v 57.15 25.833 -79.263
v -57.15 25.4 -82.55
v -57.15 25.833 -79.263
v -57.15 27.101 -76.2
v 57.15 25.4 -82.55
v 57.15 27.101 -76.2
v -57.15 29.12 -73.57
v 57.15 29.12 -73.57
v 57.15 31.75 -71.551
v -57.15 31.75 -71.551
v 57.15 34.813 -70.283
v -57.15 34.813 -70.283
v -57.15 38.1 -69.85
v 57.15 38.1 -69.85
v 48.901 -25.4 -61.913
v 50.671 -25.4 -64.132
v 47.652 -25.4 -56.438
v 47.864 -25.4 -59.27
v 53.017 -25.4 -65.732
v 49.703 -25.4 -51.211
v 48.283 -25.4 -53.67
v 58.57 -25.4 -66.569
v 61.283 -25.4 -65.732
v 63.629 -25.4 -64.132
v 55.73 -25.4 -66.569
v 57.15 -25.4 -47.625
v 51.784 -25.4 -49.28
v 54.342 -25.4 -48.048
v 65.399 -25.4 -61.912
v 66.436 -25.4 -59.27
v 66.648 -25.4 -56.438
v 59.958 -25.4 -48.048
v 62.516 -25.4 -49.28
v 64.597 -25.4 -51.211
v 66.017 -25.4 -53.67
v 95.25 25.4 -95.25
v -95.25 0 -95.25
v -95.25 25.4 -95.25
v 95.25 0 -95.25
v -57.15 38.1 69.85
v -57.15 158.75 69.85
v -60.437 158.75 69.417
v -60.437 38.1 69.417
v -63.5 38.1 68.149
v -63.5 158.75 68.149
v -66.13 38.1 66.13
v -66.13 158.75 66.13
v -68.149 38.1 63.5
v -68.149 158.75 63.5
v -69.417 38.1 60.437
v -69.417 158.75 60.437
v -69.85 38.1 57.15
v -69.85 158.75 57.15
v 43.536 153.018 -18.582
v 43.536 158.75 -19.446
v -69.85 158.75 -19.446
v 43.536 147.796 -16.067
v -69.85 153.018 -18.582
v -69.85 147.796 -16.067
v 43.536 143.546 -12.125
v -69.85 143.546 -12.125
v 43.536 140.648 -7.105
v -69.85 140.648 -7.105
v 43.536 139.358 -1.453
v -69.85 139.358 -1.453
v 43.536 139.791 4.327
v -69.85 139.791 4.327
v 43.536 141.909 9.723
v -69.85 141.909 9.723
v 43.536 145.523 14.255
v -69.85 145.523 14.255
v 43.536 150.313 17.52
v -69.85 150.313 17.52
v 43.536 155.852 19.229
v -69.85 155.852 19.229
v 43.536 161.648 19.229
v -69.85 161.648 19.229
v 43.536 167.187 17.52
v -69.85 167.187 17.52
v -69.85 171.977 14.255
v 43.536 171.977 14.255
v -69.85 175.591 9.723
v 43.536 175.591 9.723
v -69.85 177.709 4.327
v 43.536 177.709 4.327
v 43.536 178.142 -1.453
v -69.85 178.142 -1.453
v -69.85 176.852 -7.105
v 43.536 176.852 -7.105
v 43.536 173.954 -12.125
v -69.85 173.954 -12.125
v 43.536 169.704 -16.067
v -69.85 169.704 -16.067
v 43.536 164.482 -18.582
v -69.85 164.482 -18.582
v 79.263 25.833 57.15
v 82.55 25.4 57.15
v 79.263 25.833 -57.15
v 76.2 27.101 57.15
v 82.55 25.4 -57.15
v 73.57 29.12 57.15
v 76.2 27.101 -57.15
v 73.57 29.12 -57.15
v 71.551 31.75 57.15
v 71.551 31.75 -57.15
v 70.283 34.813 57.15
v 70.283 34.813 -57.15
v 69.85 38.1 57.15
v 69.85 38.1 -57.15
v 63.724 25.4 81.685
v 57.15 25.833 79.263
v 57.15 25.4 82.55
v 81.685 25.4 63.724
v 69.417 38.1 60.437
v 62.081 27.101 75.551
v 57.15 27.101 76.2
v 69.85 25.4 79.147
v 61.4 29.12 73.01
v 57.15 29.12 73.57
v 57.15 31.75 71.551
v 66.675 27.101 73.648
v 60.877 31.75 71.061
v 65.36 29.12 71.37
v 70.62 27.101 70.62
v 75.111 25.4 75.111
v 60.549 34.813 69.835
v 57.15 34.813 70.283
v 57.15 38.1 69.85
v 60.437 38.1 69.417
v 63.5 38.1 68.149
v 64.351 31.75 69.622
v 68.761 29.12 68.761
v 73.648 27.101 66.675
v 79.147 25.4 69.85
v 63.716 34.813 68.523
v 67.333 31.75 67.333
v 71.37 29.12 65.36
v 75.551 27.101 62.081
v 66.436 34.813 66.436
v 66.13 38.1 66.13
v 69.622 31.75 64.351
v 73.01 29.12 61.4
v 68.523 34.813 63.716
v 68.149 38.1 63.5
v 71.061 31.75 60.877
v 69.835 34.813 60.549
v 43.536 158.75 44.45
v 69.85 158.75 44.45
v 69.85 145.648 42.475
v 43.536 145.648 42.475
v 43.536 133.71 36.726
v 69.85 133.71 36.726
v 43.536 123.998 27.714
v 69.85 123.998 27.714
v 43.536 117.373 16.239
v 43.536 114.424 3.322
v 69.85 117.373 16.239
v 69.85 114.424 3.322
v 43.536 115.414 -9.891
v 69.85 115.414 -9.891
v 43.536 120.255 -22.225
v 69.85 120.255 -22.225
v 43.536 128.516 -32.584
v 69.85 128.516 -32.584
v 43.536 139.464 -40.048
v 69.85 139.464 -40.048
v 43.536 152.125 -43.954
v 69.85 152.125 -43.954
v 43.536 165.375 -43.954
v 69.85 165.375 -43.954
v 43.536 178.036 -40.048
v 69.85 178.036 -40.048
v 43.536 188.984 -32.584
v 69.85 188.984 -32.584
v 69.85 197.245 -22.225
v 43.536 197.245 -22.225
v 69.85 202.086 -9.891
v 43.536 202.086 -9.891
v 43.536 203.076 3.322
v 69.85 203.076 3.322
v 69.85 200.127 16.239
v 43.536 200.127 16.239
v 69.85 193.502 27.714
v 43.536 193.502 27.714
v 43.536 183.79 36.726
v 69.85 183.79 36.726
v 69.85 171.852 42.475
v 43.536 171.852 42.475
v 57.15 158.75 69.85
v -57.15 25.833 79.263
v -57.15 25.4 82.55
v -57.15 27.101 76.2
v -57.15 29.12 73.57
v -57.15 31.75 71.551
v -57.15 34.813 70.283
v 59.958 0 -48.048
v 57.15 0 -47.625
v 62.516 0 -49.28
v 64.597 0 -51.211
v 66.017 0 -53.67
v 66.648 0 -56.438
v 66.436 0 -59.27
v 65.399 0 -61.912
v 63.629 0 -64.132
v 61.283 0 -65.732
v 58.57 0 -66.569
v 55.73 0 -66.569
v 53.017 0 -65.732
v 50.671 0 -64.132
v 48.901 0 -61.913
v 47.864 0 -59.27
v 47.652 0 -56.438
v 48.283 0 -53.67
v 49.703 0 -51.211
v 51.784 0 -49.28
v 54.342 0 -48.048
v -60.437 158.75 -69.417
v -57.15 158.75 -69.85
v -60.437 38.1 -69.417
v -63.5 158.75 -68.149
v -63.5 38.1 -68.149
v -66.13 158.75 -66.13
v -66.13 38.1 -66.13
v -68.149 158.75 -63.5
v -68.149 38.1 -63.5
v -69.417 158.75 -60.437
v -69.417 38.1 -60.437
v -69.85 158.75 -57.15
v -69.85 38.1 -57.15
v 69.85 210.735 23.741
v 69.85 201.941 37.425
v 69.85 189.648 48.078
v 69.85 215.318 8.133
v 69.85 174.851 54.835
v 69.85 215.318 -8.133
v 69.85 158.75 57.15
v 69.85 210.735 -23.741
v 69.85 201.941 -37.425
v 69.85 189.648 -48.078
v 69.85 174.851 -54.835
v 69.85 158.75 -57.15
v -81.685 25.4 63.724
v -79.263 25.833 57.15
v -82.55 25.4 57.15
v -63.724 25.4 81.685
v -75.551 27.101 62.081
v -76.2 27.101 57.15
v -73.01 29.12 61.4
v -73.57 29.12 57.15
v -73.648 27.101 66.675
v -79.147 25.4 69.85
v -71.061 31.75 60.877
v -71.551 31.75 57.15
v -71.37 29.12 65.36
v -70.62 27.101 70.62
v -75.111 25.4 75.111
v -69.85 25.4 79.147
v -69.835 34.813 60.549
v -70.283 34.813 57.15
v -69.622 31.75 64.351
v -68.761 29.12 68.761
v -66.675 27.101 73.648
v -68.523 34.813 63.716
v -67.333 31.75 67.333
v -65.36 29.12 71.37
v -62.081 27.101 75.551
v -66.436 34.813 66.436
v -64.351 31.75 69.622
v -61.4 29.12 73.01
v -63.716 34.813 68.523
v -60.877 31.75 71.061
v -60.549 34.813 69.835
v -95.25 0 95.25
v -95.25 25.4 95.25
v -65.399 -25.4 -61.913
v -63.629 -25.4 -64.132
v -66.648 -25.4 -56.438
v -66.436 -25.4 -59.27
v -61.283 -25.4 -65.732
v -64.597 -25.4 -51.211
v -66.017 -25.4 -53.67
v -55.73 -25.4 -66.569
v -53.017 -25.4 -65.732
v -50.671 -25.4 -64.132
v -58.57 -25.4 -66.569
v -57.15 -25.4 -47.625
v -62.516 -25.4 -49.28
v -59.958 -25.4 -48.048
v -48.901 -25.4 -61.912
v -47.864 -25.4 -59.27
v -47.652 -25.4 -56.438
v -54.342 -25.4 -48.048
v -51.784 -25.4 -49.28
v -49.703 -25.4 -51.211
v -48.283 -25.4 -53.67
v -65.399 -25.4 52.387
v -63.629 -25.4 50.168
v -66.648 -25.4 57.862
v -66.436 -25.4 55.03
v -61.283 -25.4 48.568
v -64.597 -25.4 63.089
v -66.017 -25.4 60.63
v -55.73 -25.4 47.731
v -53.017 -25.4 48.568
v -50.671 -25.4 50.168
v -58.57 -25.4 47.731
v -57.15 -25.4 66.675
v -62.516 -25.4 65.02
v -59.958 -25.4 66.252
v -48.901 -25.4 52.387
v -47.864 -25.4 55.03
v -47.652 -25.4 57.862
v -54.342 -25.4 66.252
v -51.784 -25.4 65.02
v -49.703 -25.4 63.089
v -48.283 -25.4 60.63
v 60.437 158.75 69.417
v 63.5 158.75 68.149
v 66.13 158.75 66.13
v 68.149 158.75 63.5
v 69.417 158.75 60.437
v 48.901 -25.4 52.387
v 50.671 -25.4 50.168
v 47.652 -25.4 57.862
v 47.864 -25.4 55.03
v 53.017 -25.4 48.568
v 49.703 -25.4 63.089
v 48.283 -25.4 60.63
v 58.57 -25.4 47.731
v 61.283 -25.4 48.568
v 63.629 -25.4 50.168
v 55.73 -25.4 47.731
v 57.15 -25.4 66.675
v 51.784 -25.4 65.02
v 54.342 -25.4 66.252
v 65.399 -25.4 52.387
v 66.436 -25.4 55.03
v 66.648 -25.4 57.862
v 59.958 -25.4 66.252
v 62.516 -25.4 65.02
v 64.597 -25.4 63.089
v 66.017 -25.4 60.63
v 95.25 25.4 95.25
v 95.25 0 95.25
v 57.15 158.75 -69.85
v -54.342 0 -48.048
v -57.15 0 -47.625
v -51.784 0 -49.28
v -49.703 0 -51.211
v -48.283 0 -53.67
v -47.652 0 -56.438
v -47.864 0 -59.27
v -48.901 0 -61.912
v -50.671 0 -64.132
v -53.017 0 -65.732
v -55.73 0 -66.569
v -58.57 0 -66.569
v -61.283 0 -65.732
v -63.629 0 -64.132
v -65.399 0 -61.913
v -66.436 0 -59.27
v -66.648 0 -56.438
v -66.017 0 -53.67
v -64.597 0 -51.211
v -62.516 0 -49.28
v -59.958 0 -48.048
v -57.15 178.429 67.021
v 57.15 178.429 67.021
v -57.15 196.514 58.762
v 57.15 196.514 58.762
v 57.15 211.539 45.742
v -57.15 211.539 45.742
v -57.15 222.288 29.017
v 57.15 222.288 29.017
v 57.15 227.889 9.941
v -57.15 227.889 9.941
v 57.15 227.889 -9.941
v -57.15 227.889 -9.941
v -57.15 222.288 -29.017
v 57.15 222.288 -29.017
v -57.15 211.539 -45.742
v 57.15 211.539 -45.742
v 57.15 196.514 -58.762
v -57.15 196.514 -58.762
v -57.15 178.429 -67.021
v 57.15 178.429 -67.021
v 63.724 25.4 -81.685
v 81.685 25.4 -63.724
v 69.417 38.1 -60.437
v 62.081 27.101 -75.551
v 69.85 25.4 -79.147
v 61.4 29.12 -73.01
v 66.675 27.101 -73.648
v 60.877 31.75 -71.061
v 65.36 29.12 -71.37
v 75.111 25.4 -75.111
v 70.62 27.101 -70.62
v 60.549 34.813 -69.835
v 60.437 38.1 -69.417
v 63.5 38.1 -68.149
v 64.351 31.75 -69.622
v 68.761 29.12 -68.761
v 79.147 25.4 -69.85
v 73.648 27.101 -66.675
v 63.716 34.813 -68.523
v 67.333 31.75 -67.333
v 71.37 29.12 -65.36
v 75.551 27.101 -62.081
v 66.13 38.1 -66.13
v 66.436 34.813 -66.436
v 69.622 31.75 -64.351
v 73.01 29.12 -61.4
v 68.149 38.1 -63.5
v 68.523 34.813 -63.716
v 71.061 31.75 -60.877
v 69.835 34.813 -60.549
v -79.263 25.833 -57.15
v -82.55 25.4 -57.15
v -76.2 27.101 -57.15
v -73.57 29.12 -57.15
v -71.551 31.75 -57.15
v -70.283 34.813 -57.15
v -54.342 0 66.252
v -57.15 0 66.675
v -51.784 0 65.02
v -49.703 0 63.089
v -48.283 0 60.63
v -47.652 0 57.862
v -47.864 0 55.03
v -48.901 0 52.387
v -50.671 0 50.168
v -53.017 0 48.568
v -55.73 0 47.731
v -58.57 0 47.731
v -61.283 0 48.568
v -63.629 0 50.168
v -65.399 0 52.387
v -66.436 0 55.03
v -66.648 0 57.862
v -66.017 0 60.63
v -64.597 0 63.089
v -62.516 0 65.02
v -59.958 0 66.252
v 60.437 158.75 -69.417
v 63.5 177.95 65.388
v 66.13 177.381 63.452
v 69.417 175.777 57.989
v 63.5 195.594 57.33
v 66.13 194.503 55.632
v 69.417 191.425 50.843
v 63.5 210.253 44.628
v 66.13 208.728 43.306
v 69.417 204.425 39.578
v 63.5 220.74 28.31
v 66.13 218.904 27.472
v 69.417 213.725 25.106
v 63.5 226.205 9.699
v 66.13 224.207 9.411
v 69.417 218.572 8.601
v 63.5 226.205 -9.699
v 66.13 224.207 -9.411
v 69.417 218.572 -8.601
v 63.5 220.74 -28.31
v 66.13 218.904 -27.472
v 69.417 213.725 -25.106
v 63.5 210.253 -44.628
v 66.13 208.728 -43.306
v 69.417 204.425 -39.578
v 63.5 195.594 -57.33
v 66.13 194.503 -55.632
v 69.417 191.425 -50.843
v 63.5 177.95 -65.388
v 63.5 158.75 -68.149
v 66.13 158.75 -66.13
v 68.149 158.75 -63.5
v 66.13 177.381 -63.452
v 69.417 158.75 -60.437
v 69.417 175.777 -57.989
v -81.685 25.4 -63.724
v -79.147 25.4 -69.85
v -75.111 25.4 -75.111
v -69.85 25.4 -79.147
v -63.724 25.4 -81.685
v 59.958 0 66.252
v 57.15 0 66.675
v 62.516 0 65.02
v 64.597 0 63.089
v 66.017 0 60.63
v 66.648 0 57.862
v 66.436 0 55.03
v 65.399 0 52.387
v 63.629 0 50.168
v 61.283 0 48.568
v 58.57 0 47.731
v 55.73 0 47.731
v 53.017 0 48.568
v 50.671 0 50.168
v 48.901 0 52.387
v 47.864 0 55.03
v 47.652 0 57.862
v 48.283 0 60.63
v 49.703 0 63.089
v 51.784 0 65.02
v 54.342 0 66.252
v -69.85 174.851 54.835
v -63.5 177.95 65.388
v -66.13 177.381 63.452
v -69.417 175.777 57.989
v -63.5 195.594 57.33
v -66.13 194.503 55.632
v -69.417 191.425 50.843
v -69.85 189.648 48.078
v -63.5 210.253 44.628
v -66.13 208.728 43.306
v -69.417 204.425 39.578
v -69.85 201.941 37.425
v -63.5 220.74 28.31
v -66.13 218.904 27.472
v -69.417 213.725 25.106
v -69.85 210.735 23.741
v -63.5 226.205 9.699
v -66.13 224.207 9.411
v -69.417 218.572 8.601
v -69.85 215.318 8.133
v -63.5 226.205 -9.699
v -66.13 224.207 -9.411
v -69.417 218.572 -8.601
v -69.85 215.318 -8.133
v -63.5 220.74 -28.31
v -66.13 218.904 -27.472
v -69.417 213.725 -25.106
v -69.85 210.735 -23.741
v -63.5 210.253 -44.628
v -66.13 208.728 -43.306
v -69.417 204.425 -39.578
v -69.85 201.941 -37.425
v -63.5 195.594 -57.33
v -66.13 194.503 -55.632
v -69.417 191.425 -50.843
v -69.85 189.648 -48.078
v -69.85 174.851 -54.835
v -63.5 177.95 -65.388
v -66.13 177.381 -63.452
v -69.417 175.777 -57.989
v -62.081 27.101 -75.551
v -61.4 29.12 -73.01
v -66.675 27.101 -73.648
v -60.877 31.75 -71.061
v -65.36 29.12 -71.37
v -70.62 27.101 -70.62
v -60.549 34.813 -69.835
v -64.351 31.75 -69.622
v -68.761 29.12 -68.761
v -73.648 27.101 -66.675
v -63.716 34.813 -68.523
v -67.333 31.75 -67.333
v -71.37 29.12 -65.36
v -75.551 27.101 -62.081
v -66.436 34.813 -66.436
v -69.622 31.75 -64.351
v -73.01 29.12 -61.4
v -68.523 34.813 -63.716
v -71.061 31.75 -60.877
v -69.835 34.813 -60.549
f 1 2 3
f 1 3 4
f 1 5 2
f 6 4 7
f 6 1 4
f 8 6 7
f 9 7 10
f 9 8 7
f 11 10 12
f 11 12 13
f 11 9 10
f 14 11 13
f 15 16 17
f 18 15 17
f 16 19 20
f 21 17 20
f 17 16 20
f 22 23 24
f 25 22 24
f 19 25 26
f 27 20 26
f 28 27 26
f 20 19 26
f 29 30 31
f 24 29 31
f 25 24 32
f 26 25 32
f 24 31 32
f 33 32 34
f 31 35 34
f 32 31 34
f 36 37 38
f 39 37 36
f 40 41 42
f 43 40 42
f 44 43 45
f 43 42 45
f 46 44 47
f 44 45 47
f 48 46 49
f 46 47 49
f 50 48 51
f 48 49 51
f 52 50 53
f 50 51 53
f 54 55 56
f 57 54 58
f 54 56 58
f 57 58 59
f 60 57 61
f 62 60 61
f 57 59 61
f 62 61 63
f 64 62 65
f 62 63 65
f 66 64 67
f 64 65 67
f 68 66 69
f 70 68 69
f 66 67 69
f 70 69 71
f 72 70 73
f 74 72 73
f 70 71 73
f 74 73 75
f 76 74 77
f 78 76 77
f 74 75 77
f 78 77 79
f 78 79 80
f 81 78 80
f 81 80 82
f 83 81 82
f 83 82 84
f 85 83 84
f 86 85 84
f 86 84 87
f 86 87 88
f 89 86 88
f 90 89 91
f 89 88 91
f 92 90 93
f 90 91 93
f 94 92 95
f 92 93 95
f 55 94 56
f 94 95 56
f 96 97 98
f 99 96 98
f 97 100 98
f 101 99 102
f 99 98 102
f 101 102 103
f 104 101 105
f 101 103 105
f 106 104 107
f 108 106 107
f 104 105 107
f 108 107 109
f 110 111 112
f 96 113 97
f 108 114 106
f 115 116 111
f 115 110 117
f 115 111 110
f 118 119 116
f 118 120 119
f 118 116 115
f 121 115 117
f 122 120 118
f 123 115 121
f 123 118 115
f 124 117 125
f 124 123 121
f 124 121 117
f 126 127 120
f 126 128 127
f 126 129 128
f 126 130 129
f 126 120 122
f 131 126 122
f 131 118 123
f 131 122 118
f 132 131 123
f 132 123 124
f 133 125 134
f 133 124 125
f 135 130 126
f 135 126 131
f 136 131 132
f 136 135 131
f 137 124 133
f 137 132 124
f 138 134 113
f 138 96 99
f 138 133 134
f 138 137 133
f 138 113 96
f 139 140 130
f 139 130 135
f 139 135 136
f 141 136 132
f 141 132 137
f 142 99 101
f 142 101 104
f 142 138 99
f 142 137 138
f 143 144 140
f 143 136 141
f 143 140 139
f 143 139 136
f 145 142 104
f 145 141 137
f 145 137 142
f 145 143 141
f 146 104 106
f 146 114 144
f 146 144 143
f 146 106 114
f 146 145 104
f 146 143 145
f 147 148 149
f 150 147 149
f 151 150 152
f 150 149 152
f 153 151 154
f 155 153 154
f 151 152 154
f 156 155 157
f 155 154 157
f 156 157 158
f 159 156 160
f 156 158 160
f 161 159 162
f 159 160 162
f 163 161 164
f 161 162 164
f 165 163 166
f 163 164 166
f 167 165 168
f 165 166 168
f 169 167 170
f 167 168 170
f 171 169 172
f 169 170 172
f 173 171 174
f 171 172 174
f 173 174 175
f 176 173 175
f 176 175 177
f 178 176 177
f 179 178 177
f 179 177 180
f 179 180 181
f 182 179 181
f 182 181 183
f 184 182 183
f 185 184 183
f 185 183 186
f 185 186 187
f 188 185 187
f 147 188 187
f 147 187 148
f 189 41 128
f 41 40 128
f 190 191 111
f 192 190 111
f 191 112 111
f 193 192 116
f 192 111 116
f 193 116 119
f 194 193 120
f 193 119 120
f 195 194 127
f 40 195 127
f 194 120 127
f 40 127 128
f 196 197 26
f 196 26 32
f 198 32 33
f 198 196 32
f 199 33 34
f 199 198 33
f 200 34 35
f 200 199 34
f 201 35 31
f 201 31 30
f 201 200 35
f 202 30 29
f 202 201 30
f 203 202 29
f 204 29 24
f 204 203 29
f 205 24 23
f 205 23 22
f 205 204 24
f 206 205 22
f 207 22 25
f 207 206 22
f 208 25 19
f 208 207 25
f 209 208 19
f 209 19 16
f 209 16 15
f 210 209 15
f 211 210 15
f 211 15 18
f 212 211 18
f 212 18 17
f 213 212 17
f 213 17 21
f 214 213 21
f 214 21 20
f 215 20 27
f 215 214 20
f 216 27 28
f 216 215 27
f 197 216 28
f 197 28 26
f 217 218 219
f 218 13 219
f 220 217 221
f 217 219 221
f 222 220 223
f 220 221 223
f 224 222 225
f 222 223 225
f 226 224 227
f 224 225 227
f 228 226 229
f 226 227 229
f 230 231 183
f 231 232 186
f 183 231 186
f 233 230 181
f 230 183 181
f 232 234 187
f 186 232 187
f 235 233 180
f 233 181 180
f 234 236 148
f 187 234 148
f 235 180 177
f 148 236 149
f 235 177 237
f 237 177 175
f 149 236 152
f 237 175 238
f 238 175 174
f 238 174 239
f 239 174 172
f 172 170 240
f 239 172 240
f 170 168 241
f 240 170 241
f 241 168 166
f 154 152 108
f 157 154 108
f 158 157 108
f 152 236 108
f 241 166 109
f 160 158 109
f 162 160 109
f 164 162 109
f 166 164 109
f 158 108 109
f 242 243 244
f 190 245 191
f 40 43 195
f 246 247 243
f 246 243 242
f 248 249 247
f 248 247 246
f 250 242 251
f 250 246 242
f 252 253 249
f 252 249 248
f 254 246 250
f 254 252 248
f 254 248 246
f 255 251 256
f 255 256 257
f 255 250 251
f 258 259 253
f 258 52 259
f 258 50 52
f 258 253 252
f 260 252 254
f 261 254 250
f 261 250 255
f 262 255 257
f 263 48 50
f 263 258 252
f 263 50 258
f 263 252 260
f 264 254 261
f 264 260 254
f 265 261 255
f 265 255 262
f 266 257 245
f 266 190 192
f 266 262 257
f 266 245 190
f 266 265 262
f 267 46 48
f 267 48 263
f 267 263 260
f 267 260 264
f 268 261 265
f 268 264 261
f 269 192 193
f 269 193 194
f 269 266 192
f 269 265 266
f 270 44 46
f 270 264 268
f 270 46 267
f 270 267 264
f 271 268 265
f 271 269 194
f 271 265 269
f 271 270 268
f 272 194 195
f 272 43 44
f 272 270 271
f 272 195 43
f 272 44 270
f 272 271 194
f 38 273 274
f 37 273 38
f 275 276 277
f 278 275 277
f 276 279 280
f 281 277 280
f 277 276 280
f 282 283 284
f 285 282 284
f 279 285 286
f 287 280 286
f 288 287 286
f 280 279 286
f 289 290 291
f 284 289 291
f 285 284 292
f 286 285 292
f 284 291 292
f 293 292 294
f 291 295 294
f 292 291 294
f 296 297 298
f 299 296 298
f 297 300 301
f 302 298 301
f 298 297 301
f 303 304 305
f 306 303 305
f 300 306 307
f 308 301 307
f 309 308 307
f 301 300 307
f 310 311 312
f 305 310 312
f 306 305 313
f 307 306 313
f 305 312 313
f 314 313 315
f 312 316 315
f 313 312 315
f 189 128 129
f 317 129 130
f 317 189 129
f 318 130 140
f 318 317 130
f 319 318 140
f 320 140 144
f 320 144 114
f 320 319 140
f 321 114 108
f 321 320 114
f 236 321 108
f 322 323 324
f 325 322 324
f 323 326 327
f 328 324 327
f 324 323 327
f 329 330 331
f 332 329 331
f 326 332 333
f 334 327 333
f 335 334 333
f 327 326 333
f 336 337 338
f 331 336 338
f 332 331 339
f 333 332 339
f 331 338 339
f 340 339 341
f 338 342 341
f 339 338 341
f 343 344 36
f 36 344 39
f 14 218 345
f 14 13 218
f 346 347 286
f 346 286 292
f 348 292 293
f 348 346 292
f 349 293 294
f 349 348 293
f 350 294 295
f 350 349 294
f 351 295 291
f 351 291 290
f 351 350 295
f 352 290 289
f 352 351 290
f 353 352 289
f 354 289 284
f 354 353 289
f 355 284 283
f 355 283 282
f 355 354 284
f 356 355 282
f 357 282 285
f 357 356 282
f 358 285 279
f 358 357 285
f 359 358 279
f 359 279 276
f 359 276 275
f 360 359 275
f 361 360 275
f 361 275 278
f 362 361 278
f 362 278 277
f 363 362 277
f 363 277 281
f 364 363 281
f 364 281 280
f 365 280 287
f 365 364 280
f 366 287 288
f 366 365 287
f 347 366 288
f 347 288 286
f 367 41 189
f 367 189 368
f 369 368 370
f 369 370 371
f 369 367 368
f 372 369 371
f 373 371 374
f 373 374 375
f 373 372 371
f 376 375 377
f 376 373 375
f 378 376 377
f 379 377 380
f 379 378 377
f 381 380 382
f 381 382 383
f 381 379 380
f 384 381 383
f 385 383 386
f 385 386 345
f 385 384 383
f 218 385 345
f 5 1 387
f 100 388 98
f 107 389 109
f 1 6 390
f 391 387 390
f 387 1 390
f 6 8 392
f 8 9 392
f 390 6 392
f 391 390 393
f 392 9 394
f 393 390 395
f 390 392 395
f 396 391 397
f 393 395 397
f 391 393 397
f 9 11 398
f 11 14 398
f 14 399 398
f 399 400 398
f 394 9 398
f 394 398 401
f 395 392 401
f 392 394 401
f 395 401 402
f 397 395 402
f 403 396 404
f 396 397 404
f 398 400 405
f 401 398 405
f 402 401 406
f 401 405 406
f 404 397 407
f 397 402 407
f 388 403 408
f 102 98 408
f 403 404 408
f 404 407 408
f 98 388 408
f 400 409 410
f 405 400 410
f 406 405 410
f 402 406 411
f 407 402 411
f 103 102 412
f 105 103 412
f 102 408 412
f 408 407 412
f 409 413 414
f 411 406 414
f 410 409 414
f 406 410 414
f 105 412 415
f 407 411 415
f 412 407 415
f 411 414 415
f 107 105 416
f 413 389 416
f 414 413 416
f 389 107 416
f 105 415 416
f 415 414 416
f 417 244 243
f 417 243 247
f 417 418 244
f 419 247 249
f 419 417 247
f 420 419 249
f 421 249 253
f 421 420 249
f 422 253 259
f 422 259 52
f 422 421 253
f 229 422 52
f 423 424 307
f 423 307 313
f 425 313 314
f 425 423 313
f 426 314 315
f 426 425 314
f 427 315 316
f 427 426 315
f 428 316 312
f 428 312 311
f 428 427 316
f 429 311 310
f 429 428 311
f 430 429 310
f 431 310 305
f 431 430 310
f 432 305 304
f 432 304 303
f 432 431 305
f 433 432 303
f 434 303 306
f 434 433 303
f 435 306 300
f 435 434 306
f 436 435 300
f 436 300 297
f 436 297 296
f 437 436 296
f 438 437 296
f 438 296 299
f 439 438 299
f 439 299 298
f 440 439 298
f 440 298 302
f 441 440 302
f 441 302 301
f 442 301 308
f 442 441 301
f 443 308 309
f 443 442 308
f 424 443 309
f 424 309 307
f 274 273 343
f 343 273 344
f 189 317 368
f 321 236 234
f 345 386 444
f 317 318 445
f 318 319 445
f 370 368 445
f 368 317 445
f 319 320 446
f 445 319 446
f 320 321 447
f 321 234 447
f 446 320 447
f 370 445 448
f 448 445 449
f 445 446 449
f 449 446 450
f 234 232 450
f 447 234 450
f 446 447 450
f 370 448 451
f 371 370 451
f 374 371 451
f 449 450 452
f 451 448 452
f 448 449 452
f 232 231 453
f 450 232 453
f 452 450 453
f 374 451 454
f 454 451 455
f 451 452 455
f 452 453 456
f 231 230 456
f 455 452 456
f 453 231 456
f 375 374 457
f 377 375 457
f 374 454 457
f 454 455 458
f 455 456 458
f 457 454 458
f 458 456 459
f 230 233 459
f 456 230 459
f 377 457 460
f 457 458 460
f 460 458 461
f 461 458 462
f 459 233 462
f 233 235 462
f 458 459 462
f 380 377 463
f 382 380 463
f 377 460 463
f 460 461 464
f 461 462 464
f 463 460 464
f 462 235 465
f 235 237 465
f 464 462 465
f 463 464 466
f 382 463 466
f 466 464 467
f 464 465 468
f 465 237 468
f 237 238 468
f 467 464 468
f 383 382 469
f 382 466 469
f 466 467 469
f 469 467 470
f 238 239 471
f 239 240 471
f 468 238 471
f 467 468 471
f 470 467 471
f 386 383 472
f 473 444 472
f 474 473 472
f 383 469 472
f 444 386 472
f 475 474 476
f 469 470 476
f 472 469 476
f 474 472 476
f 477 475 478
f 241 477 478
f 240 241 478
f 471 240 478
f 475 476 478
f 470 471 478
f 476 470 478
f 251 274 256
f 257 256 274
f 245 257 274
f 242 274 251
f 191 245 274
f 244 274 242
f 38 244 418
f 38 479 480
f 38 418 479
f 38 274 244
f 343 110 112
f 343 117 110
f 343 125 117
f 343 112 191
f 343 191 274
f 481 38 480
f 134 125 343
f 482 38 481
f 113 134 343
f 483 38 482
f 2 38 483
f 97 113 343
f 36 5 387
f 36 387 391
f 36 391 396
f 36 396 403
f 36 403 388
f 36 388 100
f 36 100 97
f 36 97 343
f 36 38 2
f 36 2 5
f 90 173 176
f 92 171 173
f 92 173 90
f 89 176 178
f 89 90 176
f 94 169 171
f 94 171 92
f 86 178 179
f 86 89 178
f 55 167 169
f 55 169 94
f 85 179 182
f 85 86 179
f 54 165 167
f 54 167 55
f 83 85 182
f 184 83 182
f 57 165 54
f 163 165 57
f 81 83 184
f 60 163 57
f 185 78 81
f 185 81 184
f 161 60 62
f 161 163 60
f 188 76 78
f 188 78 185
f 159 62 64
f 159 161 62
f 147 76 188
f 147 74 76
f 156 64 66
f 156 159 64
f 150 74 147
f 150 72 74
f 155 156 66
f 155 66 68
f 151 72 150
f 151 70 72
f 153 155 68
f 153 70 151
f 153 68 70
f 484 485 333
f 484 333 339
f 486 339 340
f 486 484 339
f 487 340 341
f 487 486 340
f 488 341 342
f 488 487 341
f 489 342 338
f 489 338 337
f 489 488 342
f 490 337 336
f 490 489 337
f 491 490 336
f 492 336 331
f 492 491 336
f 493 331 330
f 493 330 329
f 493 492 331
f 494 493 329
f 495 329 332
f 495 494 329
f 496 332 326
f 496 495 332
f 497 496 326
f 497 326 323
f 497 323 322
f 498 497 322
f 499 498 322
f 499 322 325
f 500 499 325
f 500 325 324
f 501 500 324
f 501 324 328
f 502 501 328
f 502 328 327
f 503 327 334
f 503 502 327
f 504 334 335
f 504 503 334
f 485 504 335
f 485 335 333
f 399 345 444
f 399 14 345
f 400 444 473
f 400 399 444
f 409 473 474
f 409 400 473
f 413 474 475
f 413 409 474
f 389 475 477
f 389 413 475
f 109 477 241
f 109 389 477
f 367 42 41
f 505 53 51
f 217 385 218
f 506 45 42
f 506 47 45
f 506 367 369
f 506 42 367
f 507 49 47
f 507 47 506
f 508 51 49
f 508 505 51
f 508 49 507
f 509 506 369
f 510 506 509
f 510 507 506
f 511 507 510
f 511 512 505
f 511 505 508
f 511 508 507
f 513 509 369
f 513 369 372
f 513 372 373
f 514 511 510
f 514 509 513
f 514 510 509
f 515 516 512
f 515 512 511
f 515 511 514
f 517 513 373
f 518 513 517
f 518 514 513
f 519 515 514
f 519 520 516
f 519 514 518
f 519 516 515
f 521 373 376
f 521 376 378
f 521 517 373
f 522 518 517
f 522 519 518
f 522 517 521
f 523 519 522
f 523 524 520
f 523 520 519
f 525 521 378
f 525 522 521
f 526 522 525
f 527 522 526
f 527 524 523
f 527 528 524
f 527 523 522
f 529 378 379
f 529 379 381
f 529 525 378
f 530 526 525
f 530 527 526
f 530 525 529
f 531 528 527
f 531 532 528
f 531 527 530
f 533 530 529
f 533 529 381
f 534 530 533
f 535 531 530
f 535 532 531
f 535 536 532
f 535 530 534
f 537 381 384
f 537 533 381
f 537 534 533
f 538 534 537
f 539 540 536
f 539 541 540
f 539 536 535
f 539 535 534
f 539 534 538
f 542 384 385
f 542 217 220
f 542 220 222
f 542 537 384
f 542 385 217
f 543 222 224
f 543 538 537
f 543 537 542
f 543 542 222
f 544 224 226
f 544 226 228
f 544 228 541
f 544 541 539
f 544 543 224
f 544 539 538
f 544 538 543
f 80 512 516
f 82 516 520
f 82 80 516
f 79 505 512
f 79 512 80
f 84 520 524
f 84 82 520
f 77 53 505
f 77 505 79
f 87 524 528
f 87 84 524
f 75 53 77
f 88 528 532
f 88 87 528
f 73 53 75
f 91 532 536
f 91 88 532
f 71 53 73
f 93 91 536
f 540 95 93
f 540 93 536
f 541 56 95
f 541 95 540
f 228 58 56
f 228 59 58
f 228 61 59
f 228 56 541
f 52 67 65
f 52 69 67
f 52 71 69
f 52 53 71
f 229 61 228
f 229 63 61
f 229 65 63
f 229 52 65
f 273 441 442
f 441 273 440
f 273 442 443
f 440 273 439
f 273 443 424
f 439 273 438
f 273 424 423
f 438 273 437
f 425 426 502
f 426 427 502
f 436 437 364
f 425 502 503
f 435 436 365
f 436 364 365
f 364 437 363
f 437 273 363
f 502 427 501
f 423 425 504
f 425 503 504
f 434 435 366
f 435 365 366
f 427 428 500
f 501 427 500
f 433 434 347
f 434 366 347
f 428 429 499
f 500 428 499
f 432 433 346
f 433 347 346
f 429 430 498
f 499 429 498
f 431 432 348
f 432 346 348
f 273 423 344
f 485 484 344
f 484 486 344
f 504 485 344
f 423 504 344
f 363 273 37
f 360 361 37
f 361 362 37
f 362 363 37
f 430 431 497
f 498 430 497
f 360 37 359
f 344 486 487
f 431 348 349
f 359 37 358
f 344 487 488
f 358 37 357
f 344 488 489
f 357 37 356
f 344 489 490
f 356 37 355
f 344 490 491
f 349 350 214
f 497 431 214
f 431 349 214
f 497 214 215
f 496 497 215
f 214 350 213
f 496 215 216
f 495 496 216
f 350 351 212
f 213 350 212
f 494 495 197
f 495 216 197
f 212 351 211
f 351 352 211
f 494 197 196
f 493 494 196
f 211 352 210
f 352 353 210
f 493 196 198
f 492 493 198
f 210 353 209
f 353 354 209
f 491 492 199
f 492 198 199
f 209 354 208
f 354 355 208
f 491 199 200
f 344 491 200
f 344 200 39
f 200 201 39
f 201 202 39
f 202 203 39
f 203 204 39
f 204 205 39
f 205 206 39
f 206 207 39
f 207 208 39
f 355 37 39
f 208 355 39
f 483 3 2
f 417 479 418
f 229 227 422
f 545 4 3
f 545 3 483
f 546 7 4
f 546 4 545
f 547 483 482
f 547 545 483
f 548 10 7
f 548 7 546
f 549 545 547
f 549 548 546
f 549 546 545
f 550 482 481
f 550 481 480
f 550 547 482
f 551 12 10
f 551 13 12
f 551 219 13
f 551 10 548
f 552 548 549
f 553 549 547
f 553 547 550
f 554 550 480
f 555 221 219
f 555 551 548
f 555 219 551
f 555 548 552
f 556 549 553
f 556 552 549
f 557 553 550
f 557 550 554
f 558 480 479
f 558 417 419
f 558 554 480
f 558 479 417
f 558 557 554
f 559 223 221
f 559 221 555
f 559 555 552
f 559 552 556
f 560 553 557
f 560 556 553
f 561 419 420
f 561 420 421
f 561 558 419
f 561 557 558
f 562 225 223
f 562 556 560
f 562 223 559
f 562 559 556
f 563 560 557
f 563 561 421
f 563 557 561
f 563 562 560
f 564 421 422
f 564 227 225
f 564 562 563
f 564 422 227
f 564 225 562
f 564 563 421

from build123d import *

# Parameters (mm, degrees)
SKETCH1_W                                   = 190.5
SKETCH1_H                                   = 190.5
SKETCH1_R                                   = 9.525
BOSS_EXTRUDE1_DEPTH                         = 25.4
SKETCH1_3_R                                 = 9.525
BOSS_EXTRUDE2_DEPTH                         = 25.4
SKETCH3_W                                   = 139.7
SKETCH3_H                                   = 139.7
BOSS_EXTRUDE3_DEPTH                         = 203.2
FILLET1_RADIUS                              = 69.85
FILLET1_LENGTH                              = 139.7
CBORE_FOR_1_1_2_HEAVY_HEX_BOLT1_D           = 38.89248
CBORE_FOR_1_1_2_HEAVY_HEX_BOLT1_CBORE_D     = 88.9
CBORE_FOR_1_1_2_HEAVY_HEX_BOLT1_CBORE_DEPTH = 26.3144
FILLET2_R                                   = 12.7


with BuildPart() as part:
    # Sketch1 → Boss-Extrude1 (new body)
    # profile 1 of 5: a face of its own
    with BuildSketch(Plane(origin=(0, 0, 0), x_dir=(1, 0, 0), z_dir=(0, 1, 0))):
        Rectangle(SKETCH1_W, SKETCH1_H)
        with Locations((-57.15, -57.15)):
            Circle(SKETCH1_R, mode=Mode.SUBTRACT)
        with Locations((57.15, -57.15)):
            Circle(SKETCH1_R, mode=Mode.SUBTRACT)
        with Locations((57.15, 57.15)):
            Circle(SKETCH1_R, mode=Mode.SUBTRACT)
        with Locations((-57.15, 57.15)):
            Circle(SKETCH1_R, mode=Mode.SUBTRACT)
    # profile 2 of 5: a face of its own
    with BuildSketch(Plane(origin=(0, 0, 0), x_dir=(1, 0, 0), z_dir=(0, 1, 0))):
        with Locations((-57.15, -57.15)):
            Circle(SKETCH1_R)
    # profile 3 of 5: a face of its own
    with BuildSketch(Plane(origin=(0, 0, 0), x_dir=(1, 0, 0), z_dir=(0, 1, 0))):
        with Locations((-57.15, 57.15)):
            Circle(SKETCH1_R)
    # profile 4 of 5: a face of its own
    with BuildSketch(Plane(origin=(0, 0, 0), x_dir=(1, 0, 0), z_dir=(0, 1, 0))):
        with Locations((57.15, 57.15)):
            Circle(SKETCH1_R)
    # profile 5 of 5: a face of its own
    with BuildSketch(Plane(origin=(0, 0, 0), x_dir=(1, 0, 0), z_dir=(0, 1, 0))):
        with Locations((57.15, -57.15)):
            Circle(SKETCH1_R)
    extrude(amount=BOSS_EXTRUDE1_DEPTH)

    # Sketch1<3> → Boss-Extrude2 (add)
    with BuildSketch(Plane(origin=(0, 0, 0), x_dir=(1, 0, 0), z_dir=(0, 1, 0))):
        with Locations(Location((-57.15, 57.15, 0), (0, 0, 270))):
            Circle(SKETCH1_3_R)
        with Locations(Location((57.15, 57.15, 0), (0, 0, 270))):
            Circle(SKETCH1_3_R)
        with Locations(Location((57.15, -57.15, 0), (0, 0, 270))):
            Circle(SKETCH1_3_R)
        with Locations(Location((-57.15, -57.15, 0), (0, 0, 270))):
            Circle(SKETCH1_3_R)
    extrude(amount=-BOSS_EXTRUDE2_DEPTH)

    # Sketch3 → Boss-Extrude3 (add)
    with BuildSketch(Plane(origin=(0, 25.4, 0), x_dir=(1, 0, 0), z_dir=(0, 1, 0))):
        Rectangle(SKETCH3_W, SKETCH3_H)
    extrude(amount=BOSS_EXTRUDE3_DEPTH)

    # Fillet1: full round fillet: the end face becomes a half cylinder, R = half its width
    fillet1_face = Plane((0, 228.6, 0), x_dir=(-1, 0, 0), z_dir=(0, 1, 0))  # on the end face: x along it, z out of the body
    fillet1_slab = fillet1_face.offset(-FILLET1_RADIUS / 2) * Box(FILLET1_LENGTH, 2 * FILLET1_RADIUS, FILLET1_RADIUS, mode=Mode.PRIVATE)  # the body's end, R deep
    fillet1_round = Plane((0, 158.75, 0), x_dir=(0, 1, 0), z_dir=(-1, 0, 0)) * Cylinder(FILLET1_RADIUS, FILLET1_LENGTH, mode=Mode.PRIVATE)  # its axis R under the face
    add(fillet1_slab - fillet1_round, mode=Mode.SUBTRACT)

    # CBORE for 1-1/2 Heavy Hex Bolt1 (through all)
    with Locations(Plane(origin=(69.85, 0, 0), x_dir=(0, 0, 1), z_dir=(1, 0, 0))):
        with Locations((0, -158.75)):
            CounterBoreHole(CBORE_FOR_1_1_2_HEAVY_HEX_BOLT1_D / 2, CBORE_FOR_1_1_2_HEAVY_HEX_BOLT1_CBORE_D / 2, CBORE_FOR_1_1_2_HEAVY_HEX_BOLT1_CBORE_DEPTH)

    # Fillet2
    fillet2_edges = [part.edges().sort_by_distance(p)[0] for p in [
        (0, 25.4, -69.85),
        (-69.85, 25.4, 0),
        (0, 25.4, 69.85),
        (69.85, 25.4, 0),
        (69.85, 92.075, 69.85),
        (-69.85, 92.075, 69.85),
        (-69.85, 92.075, -69.85),
        (69.85, 92.075, -69.85),
        (69.85, 228.6, 0),
        (-69.85, 228.6, 0),
    ]]
    fillet(fillet2_edges, radius=FILLET2_R)


solid = part.part
